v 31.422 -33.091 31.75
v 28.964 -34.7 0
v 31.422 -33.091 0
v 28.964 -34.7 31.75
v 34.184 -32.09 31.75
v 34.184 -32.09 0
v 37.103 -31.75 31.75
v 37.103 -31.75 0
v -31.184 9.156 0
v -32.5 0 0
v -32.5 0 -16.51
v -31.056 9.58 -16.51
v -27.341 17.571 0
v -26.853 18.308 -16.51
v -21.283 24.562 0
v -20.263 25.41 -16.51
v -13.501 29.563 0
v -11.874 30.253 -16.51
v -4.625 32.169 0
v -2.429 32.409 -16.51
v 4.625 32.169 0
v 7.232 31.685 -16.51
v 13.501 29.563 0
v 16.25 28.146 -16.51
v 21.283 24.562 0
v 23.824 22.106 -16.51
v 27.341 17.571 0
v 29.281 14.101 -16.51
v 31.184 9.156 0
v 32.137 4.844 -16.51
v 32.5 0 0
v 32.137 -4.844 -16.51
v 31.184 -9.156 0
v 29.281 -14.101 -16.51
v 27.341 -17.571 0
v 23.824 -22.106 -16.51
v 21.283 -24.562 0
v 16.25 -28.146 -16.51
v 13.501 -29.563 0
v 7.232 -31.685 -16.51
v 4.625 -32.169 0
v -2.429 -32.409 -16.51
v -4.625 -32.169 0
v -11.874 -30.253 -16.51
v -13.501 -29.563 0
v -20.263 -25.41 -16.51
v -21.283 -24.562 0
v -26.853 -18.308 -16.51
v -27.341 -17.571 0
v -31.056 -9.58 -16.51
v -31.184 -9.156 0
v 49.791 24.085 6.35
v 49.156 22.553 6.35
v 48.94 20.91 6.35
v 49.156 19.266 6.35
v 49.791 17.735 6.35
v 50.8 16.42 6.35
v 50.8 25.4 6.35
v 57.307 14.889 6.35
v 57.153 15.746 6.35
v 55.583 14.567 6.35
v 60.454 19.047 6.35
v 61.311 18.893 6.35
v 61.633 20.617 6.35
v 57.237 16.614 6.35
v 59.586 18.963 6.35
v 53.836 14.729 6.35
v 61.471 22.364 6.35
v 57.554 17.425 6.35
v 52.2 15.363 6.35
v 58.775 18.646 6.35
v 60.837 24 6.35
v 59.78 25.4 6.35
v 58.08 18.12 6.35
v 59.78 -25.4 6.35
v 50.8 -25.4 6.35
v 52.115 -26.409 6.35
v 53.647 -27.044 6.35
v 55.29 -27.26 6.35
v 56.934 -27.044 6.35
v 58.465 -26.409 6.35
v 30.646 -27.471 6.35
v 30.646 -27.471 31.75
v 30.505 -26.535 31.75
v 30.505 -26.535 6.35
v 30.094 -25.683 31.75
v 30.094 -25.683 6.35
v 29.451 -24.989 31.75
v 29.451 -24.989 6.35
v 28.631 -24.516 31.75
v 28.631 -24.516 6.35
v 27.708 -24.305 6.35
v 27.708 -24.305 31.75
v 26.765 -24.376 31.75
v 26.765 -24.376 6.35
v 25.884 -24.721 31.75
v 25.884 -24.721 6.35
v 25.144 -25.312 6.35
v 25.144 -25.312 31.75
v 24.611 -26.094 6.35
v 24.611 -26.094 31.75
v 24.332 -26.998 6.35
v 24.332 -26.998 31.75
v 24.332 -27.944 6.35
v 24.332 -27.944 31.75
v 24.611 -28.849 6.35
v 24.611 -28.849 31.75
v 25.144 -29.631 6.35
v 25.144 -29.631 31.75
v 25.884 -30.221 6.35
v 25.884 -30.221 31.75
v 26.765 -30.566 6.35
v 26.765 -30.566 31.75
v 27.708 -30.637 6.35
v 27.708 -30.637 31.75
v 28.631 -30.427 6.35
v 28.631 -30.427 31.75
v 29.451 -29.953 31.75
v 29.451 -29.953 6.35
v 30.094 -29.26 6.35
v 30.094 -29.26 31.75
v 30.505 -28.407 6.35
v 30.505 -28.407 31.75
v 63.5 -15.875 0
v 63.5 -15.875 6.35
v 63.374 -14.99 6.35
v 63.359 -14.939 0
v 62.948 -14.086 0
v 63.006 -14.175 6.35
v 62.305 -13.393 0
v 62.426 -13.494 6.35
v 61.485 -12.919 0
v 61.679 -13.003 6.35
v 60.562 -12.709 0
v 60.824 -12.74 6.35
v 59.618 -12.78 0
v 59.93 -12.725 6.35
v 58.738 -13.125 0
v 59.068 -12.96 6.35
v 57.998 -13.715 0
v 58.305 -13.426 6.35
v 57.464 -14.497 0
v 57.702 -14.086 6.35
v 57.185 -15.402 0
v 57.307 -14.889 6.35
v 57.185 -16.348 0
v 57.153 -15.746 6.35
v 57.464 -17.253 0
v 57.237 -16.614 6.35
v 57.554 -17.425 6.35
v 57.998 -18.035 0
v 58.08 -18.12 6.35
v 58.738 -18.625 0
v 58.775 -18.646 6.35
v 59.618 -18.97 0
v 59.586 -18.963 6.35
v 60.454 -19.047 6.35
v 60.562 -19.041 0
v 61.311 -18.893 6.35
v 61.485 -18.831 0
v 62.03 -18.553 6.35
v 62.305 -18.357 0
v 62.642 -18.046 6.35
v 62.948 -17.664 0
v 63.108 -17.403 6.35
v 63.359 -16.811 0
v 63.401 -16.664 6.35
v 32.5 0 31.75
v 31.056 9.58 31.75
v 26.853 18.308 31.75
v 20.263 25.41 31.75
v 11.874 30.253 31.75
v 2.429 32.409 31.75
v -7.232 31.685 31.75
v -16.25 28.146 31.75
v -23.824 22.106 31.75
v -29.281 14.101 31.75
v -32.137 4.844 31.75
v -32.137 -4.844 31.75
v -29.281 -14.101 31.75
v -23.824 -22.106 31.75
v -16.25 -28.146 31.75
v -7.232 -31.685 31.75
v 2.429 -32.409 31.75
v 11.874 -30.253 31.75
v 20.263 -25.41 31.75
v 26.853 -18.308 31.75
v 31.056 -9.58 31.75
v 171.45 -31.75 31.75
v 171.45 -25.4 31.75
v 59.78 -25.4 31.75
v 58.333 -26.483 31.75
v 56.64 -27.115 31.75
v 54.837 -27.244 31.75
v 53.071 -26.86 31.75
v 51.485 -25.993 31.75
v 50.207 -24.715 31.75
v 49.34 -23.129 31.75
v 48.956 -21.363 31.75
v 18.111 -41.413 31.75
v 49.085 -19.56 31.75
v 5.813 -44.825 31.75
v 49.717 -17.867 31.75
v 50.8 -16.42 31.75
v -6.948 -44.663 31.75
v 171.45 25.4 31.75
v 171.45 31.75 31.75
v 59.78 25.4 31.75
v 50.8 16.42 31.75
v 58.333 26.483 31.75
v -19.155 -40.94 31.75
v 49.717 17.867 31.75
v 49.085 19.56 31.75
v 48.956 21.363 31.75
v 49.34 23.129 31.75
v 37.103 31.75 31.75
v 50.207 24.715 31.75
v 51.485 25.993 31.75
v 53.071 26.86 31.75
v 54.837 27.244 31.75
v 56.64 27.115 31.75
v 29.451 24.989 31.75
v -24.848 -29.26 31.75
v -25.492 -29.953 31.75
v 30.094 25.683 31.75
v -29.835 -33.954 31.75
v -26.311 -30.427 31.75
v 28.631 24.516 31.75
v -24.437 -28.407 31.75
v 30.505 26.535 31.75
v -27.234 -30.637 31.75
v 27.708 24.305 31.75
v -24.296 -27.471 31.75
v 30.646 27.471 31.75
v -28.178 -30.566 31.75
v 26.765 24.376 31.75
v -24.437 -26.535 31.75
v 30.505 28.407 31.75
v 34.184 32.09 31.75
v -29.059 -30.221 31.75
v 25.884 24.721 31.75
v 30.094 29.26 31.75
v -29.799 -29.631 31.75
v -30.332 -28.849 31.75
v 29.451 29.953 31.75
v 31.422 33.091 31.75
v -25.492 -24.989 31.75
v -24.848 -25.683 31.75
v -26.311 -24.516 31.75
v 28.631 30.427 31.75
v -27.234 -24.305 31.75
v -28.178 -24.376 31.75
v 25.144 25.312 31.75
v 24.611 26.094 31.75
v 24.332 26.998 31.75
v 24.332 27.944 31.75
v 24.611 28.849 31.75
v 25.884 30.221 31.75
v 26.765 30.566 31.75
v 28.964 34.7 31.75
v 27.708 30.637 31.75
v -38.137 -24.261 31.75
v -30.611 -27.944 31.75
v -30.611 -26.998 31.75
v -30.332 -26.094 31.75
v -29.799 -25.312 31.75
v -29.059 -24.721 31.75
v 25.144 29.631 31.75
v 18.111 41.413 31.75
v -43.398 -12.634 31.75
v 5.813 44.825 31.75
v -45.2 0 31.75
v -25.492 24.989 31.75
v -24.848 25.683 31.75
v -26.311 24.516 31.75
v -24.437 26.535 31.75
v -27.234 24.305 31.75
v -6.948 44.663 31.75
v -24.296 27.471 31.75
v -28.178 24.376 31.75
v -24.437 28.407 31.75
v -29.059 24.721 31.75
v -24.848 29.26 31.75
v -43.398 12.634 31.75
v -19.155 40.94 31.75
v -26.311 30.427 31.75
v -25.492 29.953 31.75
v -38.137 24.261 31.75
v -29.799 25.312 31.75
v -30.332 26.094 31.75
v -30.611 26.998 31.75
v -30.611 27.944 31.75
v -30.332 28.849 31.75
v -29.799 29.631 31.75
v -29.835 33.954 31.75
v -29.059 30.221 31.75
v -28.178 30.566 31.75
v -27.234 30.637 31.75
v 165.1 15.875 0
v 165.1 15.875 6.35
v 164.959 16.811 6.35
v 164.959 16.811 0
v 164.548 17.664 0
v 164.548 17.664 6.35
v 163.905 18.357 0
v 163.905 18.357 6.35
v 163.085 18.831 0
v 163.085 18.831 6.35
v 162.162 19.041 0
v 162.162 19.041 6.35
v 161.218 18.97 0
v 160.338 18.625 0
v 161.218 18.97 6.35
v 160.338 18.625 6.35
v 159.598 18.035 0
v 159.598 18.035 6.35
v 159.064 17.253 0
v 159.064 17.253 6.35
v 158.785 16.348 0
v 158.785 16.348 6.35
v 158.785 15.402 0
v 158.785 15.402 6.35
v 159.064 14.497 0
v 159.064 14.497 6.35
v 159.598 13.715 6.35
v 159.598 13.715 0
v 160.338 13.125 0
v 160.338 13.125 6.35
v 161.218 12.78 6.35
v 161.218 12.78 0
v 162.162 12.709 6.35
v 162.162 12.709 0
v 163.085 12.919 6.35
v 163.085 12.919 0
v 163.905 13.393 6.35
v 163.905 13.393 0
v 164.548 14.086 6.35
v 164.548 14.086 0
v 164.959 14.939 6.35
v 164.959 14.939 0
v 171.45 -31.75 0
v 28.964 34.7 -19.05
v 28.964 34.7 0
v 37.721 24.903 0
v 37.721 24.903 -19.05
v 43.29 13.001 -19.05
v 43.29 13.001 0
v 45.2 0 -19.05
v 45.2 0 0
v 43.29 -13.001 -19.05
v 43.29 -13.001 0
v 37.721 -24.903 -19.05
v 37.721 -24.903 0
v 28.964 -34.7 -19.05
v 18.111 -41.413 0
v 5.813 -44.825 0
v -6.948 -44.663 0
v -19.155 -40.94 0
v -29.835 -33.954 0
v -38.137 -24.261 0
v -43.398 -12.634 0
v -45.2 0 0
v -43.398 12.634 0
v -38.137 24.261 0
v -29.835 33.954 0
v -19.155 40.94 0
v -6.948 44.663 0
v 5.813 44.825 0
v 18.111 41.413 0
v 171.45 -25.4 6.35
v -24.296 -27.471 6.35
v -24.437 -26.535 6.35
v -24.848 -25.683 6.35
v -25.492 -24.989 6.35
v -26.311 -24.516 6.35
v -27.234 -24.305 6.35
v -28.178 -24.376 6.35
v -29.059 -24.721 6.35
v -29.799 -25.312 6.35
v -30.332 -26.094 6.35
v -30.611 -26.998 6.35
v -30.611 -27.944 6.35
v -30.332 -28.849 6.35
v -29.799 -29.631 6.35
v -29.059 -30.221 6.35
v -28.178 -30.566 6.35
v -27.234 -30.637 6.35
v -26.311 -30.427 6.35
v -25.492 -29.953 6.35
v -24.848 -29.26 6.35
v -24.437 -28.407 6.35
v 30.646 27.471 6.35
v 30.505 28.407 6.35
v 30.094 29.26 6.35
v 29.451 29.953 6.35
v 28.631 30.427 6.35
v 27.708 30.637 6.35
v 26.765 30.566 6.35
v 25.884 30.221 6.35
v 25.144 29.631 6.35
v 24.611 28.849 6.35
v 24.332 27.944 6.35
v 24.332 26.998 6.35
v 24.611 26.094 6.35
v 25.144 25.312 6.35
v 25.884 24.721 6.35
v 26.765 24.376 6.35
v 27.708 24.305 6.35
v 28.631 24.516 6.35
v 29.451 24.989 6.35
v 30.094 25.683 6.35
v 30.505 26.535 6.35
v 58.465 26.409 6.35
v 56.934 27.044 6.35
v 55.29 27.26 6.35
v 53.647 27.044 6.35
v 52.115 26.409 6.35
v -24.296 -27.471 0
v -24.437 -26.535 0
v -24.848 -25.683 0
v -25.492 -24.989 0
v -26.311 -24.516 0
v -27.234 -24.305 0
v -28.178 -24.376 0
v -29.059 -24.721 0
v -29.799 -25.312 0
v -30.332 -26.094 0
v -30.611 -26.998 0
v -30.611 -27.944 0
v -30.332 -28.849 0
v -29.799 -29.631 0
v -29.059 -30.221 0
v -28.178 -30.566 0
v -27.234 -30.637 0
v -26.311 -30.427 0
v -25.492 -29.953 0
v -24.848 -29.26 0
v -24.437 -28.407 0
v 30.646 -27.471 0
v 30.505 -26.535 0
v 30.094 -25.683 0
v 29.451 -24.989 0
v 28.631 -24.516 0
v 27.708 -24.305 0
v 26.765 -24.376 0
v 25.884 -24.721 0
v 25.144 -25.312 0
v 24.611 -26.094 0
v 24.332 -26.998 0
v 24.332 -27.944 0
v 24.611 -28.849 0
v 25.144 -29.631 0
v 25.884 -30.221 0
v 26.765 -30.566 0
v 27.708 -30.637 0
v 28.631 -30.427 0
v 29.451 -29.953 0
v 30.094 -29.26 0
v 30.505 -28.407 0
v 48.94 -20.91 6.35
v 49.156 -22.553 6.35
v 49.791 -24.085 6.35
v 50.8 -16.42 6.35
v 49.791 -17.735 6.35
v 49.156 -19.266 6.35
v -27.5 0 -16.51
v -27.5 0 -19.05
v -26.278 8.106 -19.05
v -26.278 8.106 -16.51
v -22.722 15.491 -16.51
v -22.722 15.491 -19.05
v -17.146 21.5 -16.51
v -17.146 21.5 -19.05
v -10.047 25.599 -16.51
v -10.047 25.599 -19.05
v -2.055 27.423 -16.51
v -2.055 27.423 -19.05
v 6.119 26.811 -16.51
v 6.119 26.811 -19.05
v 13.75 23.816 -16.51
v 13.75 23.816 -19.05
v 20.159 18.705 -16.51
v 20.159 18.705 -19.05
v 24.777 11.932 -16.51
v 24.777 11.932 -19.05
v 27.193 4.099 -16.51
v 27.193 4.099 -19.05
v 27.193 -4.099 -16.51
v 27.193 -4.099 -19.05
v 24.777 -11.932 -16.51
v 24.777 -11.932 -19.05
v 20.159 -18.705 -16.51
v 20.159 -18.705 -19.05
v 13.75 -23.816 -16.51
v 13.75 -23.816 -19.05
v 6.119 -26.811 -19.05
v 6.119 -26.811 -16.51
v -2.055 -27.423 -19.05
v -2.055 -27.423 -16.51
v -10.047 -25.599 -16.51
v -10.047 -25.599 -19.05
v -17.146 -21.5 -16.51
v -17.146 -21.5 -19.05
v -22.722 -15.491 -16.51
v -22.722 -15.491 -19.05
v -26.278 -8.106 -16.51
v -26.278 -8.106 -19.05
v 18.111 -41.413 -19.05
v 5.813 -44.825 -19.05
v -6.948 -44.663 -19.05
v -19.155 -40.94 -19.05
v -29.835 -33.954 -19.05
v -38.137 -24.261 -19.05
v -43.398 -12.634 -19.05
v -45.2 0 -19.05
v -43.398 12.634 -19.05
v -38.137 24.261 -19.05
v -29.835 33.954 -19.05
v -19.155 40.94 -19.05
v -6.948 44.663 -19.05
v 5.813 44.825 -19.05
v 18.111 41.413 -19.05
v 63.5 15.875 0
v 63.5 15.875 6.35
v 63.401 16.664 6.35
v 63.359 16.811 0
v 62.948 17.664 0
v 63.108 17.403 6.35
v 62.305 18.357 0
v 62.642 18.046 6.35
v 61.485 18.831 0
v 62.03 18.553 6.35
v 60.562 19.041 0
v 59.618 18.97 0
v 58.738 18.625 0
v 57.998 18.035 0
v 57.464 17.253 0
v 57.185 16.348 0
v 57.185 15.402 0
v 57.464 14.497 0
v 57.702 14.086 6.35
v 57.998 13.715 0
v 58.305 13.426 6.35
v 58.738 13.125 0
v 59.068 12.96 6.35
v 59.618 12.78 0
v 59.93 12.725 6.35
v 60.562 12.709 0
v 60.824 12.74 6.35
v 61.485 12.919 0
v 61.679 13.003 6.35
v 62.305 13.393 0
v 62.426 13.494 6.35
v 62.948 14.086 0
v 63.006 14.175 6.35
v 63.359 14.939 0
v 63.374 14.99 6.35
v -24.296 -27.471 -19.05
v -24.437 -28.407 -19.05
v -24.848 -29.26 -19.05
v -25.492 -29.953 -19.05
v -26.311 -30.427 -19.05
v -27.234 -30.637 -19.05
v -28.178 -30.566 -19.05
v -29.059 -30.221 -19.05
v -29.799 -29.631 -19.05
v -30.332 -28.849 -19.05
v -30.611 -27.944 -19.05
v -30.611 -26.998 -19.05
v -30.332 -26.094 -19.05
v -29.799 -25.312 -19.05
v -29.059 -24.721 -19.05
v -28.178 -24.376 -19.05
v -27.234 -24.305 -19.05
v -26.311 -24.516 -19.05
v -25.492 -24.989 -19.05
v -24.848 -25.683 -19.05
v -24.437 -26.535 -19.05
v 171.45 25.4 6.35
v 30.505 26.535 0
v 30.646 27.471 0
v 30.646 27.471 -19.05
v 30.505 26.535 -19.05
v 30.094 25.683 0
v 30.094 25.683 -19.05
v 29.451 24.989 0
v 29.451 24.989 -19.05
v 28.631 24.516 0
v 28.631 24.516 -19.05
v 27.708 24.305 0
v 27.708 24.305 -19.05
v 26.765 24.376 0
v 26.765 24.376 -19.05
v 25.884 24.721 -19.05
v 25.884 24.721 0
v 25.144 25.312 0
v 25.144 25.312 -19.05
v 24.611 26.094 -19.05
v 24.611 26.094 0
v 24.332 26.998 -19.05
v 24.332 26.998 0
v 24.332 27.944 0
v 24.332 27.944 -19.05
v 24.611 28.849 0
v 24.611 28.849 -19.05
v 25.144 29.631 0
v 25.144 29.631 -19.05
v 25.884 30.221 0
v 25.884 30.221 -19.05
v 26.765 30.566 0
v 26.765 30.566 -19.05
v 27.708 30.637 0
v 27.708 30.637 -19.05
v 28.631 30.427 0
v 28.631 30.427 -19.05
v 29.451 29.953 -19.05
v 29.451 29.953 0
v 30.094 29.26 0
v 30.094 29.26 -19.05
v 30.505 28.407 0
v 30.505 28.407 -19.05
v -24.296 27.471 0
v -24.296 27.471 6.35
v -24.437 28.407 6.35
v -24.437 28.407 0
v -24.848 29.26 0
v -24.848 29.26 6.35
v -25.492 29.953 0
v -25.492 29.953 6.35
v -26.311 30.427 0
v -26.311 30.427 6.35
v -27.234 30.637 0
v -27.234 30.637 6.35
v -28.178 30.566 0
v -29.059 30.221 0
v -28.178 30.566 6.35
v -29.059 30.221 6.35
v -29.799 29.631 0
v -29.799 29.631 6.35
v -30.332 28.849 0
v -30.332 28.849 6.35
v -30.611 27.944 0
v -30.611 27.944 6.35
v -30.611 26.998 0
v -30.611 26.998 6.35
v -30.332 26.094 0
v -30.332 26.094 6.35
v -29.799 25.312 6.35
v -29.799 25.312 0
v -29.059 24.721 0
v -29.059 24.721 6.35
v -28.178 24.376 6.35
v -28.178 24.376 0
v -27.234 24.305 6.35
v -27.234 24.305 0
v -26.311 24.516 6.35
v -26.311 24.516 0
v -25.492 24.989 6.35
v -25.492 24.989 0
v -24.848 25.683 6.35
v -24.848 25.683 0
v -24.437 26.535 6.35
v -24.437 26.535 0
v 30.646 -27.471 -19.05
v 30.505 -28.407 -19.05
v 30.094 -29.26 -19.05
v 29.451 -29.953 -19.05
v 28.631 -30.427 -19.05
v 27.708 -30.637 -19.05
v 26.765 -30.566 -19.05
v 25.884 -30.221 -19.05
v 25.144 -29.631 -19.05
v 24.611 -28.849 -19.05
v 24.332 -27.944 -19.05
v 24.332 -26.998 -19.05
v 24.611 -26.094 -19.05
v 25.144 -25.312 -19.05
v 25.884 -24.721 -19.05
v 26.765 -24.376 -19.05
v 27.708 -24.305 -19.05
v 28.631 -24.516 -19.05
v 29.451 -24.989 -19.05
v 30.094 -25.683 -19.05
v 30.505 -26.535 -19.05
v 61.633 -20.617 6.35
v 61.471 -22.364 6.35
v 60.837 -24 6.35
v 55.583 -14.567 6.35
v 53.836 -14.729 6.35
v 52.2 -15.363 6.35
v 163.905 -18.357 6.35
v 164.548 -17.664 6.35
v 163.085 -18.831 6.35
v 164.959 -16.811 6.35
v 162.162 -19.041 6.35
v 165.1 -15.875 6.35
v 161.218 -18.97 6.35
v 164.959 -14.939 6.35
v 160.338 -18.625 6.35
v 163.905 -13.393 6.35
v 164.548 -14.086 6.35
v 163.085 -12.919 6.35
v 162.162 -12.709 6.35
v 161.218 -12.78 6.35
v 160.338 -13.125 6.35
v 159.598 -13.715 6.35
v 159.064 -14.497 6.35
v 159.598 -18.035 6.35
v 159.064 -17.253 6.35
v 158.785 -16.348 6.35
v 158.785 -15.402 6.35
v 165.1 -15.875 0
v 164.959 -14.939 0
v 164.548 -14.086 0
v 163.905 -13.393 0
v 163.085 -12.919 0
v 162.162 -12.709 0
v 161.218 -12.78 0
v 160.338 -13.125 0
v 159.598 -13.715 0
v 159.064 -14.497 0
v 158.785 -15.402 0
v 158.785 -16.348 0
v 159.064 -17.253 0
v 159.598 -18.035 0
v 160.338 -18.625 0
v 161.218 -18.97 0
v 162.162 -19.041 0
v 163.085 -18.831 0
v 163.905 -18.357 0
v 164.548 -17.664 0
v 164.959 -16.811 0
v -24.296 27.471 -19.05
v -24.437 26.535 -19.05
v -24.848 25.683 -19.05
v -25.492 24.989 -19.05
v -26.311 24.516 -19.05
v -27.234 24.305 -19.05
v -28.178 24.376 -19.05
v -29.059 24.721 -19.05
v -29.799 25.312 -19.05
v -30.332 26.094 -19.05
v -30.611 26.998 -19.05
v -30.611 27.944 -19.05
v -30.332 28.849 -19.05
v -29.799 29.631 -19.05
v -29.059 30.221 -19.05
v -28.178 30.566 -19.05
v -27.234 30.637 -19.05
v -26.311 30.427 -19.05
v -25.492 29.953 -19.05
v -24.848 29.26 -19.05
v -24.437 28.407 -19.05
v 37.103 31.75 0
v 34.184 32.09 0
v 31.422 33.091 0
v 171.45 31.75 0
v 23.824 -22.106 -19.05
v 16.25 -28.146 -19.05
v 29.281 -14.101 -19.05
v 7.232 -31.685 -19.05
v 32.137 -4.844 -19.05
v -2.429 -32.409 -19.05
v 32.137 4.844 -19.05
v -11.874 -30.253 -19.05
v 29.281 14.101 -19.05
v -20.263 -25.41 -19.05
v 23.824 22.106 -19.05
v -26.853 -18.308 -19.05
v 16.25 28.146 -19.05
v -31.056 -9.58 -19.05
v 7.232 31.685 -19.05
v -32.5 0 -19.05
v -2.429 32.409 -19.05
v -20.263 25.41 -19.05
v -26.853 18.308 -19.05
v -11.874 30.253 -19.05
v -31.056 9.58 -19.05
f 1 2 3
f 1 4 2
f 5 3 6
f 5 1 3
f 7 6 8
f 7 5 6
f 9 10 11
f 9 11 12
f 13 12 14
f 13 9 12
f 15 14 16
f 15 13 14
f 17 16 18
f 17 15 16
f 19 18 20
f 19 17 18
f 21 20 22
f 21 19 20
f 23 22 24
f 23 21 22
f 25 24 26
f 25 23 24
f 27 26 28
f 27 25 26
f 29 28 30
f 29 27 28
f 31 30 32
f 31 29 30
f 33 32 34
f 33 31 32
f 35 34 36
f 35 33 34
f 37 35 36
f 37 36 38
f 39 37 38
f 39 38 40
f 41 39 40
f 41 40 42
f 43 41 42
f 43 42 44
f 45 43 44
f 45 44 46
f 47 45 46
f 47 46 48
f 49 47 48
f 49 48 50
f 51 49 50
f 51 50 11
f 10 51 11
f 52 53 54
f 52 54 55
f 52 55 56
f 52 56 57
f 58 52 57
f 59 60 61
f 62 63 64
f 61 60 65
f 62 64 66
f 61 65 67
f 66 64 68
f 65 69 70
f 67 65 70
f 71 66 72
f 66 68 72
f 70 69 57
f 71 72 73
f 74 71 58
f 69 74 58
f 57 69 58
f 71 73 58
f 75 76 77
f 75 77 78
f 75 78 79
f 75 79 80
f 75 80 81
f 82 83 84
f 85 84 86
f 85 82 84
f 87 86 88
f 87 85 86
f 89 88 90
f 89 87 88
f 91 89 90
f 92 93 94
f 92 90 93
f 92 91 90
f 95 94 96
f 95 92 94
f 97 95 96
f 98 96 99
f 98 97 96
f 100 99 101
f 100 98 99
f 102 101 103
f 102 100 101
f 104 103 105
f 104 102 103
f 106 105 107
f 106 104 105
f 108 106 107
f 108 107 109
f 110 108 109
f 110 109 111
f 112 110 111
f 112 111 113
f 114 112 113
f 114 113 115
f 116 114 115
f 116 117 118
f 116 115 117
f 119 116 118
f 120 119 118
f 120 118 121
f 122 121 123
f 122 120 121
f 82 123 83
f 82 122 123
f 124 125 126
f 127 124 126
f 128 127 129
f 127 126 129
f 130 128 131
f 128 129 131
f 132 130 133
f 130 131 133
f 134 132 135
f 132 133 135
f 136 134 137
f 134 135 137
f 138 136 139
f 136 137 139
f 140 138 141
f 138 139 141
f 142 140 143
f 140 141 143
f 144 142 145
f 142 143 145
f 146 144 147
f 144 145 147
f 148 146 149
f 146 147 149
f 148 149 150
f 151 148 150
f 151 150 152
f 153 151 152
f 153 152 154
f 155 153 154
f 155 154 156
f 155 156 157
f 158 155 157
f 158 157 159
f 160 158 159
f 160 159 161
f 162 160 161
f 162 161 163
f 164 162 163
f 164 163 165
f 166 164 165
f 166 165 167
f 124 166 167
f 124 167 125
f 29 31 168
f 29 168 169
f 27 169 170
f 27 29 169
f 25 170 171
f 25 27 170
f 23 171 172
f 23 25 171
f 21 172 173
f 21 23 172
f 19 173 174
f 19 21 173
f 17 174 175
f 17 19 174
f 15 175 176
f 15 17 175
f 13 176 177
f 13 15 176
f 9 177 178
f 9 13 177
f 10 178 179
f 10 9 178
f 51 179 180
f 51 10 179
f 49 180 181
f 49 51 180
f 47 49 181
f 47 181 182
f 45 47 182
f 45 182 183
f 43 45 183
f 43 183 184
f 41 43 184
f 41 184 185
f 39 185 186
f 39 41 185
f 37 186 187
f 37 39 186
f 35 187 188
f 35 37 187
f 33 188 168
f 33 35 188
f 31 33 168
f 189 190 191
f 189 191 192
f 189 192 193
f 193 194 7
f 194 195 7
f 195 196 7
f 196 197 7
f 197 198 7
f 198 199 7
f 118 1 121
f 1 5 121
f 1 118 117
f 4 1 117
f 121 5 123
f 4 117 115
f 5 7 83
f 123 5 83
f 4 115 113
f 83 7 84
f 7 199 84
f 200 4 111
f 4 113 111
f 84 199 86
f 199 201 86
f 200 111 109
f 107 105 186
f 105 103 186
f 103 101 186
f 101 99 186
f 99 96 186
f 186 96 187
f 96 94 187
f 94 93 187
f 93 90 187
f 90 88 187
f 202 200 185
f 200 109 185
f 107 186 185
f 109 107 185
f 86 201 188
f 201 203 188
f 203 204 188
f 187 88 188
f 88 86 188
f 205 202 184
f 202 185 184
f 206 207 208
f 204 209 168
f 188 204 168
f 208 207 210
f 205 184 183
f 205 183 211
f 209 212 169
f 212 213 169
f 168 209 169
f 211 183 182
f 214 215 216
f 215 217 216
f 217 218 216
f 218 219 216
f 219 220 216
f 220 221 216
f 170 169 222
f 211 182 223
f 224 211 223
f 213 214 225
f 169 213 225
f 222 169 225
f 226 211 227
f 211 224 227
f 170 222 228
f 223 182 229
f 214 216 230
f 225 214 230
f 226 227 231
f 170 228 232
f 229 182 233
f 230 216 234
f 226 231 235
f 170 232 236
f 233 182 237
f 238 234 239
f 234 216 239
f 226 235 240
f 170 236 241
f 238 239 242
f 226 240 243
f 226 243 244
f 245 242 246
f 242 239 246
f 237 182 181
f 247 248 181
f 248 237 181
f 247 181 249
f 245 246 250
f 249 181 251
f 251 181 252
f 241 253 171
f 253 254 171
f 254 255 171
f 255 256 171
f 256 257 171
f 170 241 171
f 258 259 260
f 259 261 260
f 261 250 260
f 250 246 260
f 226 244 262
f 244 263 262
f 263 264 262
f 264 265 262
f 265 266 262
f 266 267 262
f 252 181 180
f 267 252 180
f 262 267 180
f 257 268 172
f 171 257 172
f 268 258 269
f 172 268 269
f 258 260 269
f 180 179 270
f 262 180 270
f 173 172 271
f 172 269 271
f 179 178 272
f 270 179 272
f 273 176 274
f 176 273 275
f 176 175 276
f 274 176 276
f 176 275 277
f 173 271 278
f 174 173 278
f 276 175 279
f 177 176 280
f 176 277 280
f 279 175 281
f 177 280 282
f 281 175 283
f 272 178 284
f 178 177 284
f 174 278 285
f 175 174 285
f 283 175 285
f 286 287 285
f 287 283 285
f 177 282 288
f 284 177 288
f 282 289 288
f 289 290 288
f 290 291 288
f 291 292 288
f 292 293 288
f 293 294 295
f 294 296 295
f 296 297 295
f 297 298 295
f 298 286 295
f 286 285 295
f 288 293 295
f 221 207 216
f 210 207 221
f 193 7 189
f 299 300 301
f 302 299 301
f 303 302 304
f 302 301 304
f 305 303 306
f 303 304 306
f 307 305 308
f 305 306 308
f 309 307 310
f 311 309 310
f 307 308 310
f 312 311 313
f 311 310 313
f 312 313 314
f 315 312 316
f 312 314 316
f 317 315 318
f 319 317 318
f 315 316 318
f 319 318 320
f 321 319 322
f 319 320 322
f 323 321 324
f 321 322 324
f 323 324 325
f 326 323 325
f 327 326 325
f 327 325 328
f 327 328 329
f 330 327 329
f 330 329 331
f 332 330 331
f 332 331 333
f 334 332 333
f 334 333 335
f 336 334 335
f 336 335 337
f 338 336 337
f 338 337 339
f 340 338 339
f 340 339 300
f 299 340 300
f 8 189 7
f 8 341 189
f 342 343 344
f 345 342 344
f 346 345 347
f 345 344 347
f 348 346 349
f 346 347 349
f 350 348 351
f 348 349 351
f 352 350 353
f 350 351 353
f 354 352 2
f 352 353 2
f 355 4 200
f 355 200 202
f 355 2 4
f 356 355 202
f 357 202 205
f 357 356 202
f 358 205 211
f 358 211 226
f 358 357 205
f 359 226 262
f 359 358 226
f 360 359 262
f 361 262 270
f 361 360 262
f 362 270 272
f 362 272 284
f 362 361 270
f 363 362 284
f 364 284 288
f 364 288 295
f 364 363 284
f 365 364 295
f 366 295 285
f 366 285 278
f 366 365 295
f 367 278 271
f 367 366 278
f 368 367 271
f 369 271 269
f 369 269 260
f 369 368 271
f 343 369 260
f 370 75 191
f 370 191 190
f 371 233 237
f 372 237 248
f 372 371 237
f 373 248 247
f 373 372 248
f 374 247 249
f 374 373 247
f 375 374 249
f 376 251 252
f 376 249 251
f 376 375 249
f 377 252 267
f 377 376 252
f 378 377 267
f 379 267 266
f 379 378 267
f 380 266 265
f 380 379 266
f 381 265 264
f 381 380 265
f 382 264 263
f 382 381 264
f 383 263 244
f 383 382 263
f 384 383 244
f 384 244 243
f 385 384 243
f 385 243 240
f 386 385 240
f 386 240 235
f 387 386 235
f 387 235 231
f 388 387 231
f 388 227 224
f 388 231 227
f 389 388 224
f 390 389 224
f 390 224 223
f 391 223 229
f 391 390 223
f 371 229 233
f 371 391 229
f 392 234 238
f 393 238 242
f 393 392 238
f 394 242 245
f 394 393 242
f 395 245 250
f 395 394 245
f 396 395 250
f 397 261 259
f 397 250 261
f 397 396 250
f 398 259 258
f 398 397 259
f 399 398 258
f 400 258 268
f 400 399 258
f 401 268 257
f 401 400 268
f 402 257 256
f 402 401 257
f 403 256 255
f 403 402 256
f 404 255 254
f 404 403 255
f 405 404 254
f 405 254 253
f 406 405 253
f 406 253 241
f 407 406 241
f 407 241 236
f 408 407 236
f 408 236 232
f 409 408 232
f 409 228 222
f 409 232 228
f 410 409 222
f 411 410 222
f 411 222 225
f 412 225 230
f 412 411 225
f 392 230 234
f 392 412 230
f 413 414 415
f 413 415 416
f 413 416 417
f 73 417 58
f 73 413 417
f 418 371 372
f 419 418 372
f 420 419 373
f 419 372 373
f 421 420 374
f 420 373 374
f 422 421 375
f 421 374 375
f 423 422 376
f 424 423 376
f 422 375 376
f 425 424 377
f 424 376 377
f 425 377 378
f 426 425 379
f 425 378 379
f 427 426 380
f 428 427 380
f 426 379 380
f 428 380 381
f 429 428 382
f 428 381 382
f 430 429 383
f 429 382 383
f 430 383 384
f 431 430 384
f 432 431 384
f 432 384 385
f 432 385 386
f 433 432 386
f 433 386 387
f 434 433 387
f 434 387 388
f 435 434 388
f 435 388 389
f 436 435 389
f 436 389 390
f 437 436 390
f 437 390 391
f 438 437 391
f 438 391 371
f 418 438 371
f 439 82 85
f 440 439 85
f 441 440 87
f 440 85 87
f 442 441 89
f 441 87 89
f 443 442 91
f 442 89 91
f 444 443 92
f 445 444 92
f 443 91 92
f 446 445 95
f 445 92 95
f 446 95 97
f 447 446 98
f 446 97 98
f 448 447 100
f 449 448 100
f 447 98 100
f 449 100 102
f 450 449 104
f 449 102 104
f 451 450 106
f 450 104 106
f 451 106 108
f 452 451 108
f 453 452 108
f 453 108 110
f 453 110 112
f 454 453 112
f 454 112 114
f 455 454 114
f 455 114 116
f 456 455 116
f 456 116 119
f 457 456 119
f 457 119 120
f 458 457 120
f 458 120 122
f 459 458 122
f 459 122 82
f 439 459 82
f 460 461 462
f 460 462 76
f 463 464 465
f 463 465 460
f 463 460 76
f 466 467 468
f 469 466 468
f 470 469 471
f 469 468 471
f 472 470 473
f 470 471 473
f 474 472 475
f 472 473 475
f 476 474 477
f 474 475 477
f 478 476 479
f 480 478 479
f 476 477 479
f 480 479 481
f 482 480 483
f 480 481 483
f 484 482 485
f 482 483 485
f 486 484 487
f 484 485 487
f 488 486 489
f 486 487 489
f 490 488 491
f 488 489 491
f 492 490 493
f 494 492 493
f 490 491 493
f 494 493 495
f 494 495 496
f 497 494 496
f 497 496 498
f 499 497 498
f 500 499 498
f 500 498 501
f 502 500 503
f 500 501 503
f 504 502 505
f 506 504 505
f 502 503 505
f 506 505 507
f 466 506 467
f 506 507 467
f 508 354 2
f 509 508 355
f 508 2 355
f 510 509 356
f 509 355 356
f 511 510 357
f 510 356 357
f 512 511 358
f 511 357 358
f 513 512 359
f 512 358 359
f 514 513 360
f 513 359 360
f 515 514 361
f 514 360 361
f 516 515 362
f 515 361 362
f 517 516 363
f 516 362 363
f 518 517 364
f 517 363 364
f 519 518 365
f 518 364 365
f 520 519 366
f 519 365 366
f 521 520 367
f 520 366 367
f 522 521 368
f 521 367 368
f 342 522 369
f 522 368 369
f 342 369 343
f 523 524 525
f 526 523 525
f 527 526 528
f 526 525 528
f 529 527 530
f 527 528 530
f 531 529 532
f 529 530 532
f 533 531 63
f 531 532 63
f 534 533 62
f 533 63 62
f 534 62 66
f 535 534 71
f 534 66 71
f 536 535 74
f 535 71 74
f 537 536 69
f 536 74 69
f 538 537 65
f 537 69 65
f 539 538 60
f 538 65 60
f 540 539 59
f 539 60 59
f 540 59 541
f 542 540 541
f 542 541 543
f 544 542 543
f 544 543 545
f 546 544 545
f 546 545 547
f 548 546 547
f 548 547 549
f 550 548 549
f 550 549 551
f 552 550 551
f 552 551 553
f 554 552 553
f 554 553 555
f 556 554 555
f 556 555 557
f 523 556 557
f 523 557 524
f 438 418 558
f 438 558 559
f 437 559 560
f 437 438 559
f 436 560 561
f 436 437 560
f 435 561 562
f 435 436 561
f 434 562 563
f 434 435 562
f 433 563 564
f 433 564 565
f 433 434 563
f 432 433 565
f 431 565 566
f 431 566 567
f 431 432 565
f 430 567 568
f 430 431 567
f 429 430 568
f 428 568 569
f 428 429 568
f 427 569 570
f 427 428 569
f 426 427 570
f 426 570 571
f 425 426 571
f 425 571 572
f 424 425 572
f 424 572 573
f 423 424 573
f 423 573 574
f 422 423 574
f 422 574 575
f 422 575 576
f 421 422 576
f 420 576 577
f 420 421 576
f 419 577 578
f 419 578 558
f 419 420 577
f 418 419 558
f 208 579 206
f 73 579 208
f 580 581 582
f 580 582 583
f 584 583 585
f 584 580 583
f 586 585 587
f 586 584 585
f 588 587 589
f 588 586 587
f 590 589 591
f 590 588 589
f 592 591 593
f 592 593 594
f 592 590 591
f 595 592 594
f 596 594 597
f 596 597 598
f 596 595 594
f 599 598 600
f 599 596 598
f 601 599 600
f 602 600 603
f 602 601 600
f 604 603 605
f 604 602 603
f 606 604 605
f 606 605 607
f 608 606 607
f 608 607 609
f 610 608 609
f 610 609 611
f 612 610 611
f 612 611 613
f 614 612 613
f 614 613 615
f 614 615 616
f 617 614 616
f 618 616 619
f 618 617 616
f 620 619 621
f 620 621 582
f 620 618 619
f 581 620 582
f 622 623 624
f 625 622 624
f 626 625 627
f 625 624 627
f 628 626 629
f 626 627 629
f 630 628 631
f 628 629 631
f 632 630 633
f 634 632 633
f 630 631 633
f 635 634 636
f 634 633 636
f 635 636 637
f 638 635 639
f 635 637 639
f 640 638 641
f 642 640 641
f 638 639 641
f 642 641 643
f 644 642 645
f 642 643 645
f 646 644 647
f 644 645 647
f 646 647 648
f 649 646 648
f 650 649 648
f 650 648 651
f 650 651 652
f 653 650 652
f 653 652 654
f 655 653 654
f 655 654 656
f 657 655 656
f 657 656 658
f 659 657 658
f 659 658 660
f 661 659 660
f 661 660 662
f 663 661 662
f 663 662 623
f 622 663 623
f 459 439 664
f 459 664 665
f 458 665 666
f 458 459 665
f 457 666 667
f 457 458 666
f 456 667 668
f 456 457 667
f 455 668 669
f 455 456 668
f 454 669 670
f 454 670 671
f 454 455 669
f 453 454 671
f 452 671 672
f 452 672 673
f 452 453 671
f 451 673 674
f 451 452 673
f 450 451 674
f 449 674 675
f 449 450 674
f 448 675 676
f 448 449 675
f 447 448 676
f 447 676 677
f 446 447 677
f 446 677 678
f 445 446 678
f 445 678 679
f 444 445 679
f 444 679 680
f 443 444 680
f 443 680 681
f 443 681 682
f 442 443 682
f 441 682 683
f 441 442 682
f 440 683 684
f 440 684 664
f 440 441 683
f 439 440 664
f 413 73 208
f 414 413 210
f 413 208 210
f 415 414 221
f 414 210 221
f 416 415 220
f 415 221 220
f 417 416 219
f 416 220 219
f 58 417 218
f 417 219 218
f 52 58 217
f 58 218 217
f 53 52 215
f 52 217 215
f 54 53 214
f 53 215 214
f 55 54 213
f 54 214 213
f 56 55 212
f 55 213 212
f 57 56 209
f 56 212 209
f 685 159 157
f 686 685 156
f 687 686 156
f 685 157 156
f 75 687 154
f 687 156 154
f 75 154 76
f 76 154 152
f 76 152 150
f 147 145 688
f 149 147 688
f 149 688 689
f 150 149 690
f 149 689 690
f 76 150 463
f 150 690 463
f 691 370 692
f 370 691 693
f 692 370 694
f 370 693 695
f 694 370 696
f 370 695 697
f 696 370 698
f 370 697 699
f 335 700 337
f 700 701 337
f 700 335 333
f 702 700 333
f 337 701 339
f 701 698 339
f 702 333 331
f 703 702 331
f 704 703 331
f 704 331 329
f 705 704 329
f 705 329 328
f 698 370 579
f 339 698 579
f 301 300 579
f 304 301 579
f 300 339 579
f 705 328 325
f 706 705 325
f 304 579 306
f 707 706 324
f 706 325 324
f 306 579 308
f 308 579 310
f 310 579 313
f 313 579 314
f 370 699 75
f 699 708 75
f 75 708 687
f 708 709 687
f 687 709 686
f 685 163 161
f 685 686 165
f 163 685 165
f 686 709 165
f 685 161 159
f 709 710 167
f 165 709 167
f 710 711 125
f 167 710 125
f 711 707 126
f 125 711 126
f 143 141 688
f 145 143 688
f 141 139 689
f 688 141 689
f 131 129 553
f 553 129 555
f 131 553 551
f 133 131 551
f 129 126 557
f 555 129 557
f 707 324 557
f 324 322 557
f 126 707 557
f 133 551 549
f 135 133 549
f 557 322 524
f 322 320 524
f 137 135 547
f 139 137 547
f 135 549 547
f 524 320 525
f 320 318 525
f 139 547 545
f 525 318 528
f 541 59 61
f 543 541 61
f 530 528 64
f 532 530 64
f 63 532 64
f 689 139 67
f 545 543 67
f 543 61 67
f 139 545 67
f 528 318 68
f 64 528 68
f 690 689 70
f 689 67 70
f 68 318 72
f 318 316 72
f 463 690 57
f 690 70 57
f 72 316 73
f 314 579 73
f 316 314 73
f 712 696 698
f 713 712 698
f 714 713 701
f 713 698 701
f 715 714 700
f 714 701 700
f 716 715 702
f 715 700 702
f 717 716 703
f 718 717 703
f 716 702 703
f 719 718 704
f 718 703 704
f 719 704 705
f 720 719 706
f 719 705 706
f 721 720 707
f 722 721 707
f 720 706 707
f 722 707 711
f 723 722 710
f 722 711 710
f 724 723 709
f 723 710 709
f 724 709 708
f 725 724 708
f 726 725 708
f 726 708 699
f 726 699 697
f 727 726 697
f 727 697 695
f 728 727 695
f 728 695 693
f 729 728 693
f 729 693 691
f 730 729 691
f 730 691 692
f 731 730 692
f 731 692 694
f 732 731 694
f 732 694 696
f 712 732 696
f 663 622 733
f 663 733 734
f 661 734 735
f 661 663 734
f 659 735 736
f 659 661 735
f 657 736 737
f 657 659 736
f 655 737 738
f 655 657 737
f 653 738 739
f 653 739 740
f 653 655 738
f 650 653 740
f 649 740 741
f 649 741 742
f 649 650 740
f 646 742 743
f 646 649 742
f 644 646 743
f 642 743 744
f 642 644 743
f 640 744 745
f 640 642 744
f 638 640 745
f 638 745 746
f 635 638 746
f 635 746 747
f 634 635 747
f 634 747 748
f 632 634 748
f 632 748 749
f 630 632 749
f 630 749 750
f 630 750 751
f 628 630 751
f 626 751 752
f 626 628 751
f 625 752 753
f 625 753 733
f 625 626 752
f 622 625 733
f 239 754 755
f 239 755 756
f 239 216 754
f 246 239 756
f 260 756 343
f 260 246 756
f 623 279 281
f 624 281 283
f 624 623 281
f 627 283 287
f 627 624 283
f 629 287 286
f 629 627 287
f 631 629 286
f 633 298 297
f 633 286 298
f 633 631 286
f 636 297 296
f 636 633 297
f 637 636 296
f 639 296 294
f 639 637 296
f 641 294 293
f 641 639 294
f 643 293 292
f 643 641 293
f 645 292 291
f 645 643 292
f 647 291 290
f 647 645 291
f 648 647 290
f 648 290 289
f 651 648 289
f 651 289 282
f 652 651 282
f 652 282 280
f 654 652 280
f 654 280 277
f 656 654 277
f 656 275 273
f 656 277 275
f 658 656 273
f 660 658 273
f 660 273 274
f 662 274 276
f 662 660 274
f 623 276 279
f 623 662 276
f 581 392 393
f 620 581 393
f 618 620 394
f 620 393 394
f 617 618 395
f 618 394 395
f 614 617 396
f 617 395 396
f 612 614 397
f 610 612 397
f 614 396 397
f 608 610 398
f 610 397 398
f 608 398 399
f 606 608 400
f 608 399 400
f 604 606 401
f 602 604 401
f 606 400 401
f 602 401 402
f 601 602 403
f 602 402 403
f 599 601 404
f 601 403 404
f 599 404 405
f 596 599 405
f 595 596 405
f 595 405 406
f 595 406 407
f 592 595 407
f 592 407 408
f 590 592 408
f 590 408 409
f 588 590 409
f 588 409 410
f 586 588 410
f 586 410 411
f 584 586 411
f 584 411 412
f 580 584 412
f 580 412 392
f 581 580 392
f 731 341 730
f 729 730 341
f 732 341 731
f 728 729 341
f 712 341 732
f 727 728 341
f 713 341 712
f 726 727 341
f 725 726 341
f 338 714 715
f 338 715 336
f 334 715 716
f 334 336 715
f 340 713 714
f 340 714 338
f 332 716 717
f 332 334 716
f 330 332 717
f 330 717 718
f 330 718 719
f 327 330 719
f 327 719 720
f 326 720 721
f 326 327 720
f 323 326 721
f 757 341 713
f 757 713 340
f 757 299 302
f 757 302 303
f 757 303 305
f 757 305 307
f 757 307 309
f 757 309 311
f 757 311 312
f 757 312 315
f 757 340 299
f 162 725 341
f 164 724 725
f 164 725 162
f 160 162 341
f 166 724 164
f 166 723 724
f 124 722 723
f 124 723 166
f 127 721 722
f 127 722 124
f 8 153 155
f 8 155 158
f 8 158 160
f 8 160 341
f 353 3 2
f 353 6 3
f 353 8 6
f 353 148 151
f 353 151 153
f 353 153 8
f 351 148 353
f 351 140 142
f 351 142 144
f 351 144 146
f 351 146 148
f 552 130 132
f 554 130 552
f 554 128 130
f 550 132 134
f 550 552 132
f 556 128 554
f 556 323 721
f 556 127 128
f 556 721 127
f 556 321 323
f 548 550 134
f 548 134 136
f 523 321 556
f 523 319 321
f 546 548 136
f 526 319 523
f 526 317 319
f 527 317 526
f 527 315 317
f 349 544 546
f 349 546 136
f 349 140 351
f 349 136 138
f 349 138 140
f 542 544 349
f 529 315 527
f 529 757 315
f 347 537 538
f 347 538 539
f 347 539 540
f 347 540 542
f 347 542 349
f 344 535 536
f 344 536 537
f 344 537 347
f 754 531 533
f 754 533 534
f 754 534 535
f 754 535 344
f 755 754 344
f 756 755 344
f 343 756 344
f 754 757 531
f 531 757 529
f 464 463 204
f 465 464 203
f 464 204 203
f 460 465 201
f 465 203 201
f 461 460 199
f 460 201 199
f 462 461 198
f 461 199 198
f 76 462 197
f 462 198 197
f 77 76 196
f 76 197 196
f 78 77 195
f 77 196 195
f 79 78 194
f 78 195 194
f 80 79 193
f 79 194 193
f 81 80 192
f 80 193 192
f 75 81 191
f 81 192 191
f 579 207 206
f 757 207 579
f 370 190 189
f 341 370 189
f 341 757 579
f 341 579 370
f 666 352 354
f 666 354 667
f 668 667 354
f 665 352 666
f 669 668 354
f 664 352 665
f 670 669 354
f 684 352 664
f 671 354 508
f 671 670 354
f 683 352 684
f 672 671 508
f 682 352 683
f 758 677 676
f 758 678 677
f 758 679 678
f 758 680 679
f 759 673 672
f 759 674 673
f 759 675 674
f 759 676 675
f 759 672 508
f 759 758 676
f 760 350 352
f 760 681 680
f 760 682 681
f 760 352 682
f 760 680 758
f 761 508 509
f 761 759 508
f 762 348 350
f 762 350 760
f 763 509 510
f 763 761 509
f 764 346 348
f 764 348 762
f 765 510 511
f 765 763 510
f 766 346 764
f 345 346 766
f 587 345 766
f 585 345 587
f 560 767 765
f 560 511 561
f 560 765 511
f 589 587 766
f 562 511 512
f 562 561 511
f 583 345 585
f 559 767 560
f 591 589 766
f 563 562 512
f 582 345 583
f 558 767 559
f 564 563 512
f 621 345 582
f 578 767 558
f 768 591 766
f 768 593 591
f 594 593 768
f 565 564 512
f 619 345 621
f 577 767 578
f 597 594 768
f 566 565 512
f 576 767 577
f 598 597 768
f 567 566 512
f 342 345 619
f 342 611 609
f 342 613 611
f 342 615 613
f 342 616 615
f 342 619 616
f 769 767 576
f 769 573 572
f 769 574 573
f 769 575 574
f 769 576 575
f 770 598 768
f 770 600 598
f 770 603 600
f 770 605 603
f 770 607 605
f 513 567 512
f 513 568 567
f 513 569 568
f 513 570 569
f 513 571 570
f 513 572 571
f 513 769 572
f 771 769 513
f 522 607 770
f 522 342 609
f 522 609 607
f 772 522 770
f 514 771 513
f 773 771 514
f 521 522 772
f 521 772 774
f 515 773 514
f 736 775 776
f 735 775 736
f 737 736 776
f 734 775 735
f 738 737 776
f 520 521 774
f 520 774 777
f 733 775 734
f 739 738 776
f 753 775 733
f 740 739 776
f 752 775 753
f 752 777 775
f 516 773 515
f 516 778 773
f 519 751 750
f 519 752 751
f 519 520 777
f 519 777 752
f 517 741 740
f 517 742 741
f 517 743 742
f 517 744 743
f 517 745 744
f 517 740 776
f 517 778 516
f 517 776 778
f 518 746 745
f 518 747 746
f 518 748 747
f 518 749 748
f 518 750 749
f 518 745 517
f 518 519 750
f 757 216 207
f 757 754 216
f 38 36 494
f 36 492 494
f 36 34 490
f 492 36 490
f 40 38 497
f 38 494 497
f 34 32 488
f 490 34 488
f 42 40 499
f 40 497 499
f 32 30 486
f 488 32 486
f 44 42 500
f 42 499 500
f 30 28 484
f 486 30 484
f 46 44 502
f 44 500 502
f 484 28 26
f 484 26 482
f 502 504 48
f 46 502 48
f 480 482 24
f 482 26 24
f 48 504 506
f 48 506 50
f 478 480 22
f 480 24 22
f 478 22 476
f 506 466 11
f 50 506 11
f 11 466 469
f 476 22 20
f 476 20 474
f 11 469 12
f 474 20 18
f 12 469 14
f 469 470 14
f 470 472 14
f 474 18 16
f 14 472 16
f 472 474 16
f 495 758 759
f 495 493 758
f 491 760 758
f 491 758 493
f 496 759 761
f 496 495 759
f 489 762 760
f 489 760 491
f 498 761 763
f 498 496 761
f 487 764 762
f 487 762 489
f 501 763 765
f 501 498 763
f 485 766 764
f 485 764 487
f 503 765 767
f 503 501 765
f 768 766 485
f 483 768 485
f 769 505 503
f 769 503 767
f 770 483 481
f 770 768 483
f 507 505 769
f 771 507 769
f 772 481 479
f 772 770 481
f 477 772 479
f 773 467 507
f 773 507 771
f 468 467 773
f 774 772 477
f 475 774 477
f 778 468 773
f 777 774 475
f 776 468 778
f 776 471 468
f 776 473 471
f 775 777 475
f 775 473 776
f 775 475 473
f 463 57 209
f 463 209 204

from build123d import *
from build123d.topology import SkipClean

# Parameters (mm, degrees)
SKETCH1_R               = 32.5
SKETCH1_W               = 120.65
SKETCH1_H               = 50.8
BOSS_EXTRUDE2_DEPTH     = 6.35
BOSS_EXTRUDE3_START     = 6.35
SKETCH1_3_R             = 32.5
BOSS_EXTRUDE3_DEPTH     = 25.4
SKETCH2_R               = 3.175
CUT_EXTRUDE1_DEPTH      = 180.118124432
CUT_EXTRUDE1_DEPTH_BACK = 180.118124432
SKETCH3_R               = 6.35
CUT_EXTRUDE2_DEPTH      = 25.4
FILLET1_R               = 12.7
SKETCH5_R               = 3.175
SKETCH5_R_2             = 32.5
BOSS_EXTRUDE6_DEPTH     = 19.05
SKETCH6_R               = 32.5
SKETCH6_R_2             = 27.5
BOSS_EXTRUDE7_DEPTH     = 2.54


with BuildPart() as part:
    # Sketch1 → Boss-Extrude2 (new body)
    with BuildSketch(Plane.XY):
        with BuildLine():
            Line((32.171066193, 31.75), (171.45, 31.75))
            Line((171.45, 31.75), (171.45, 25.4))
            Line((171.45, 25.4), (50.8, 25.4))
            Line((50.8, 25.4), (50.8, -25.4))
            Line((50.8, -25.4), (171.45, -25.4))
            Line((171.45, -25.4), (171.45, -31.75))
            Line((171.45, -31.75), (32.171066193, -31.75))
            ThreePointArc((32.171066193, -31.75), (-45.2, 0), (32.171066193, 31.75))
        make_face()
        Circle(SKETCH1_R, mode=Mode.SUBTRACT)
        with Locations((111.125, 0)):
            Rectangle(SKETCH1_W, SKETCH1_H)
    extrude(amount=BOSS_EXTRUDE2_DEPTH)

    # Sketch1<3> → Boss-Extrude3 (add)
    with BuildSketch(Plane.XY.offset(BOSS_EXTRUDE3_START)):
        with BuildLine():
            Line((32.171066193, 31.75), (171.45, 31.75))
            Line((171.45, 31.75), (171.45, 25.4))
            Line((171.45, 25.4), (50.8, 25.4))
            Line((50.8, 25.4), (50.8, -25.4))
            Line((50.8, -25.4), (171.45, -25.4))
            Line((171.45, -25.4), (171.45, -31.75))
            Line((171.45, -31.75), (32.171066193, -31.75))
            ThreePointArc((32.171066193, -31.75), (-45.2, 0), (32.171066193, 31.75))
        make_face()
        Circle(SKETCH1_3_R, mode=Mode.SUBTRACT)
    extrude(amount=BOSS_EXTRUDE3_DEPTH)

    # Sketch2 → Cut-Extrude1 (cut, two sides)
    with BuildSketch(Plane.XY.offset(6.35)) as cut_extrude1_sk:
        with Locations((60.325, 15.875)):
            Circle(SKETCH2_R)
        with Locations((161.925, 15.875)):
            Circle(SKETCH2_R)
        with Locations((161.925, -15.875)):
            Circle(SKETCH2_R)
        with Locations((60.325, -15.875)):
            Circle(SKETCH2_R)
        with Locations((27.471098449, 27.471098449)):
            Circle(SKETCH2_R)
        with Locations((27.471098449, -27.471098449)):
            Circle(SKETCH2_R)
        with Locations((-27.471098449, -27.471098449)):
            Circle(SKETCH2_R)
        with Locations((-27.471098449, 27.471098449)):
            Circle(SKETCH2_R)
    extrude(amount=CUT_EXTRUDE1_DEPTH, mode=Mode.SUBTRACT)
    extrude(cut_extrude1_sk.sketch, amount=-CUT_EXTRUDE1_DEPTH_BACK, mode=Mode.SUBTRACT)

    # Sketch3 → Cut-Extrude2 (cut)
    with BuildSketch(Plane.XY.offset(31.75)):
        with Locations((55.290128061, 20.909871939)):
            Circle(SKETCH3_R)
        with Locations((55.290128061, -20.909871939)):
            Circle(SKETCH3_R)
    extrude(amount=-CUT_EXTRUDE2_DEPTH, mode=Mode.SUBTRACT)

    # Fillet1
    fillet1_edges = [part.edges().sort_by_distance(p)[0] for p in [
        (32.171066193, -31.75, 15.875),
        (32.171066193, 31.75, 15.875),
    ]]
    fillet(fillet1_edges, radius=FILLET1_R)

    # Sketch5 → Boss-Extrude6 (add)
    with SkipClean():  # the faces are left unmerged after this step: merging them gives an invalid solid
        with BuildSketch(Plane(origin=(0, 0, 0), x_dir=(-1, 0, 0), z_dir=(0, 0, -1))):
            with BuildLine():
                ThreePointArc((-28.964426695, -34.700172712), (45.2, 0), (-28.964426695, 34.700172712))
                ThreePointArc((-28.964426695, 34.700172712), (-45.2, 0), (-28.964426695, -34.700172712))
            make_face()
            with Locations(Location((-27.471098449, -27.471098449, 0), (0, 0, 180))):
                Circle(SKETCH5_R, mode=Mode.SUBTRACT)
            with Locations(Location((27.471098449, -27.471098449, 0), (0, 0, 180))):
                Circle(SKETCH5_R, mode=Mode.SUBTRACT)
            with Locations(Location((27.471098449, 27.471098449, 0), (0, 0, 180))):
                Circle(SKETCH5_R, mode=Mode.SUBTRACT)
            with Locations(Location((-27.471098449, 27.471098449, 0), (0, 0, 180))):
                Circle(SKETCH5_R, mode=Mode.SUBTRACT)
            Circle(SKETCH5_R_2, mode=Mode.SUBTRACT)
        extrude(amount=BOSS_EXTRUDE6_DEPTH)

    # Sketch6 → Boss-Extrude7 (add)
    with SkipClean():  # the faces are left unmerged after this step: merging them gives an invalid solid
        with BuildSketch(Plane(origin=(0, 0, -19.05), x_dir=(-1, 0, 0), z_dir=(0, 0, -1))):
            Circle(SKETCH6_R)
            Circle(SKETCH6_R_2, mode=Mode.SUBTRACT)
        extrude(amount=-BOSS_EXTRUDE7_DEPTH)


solid = part.part
